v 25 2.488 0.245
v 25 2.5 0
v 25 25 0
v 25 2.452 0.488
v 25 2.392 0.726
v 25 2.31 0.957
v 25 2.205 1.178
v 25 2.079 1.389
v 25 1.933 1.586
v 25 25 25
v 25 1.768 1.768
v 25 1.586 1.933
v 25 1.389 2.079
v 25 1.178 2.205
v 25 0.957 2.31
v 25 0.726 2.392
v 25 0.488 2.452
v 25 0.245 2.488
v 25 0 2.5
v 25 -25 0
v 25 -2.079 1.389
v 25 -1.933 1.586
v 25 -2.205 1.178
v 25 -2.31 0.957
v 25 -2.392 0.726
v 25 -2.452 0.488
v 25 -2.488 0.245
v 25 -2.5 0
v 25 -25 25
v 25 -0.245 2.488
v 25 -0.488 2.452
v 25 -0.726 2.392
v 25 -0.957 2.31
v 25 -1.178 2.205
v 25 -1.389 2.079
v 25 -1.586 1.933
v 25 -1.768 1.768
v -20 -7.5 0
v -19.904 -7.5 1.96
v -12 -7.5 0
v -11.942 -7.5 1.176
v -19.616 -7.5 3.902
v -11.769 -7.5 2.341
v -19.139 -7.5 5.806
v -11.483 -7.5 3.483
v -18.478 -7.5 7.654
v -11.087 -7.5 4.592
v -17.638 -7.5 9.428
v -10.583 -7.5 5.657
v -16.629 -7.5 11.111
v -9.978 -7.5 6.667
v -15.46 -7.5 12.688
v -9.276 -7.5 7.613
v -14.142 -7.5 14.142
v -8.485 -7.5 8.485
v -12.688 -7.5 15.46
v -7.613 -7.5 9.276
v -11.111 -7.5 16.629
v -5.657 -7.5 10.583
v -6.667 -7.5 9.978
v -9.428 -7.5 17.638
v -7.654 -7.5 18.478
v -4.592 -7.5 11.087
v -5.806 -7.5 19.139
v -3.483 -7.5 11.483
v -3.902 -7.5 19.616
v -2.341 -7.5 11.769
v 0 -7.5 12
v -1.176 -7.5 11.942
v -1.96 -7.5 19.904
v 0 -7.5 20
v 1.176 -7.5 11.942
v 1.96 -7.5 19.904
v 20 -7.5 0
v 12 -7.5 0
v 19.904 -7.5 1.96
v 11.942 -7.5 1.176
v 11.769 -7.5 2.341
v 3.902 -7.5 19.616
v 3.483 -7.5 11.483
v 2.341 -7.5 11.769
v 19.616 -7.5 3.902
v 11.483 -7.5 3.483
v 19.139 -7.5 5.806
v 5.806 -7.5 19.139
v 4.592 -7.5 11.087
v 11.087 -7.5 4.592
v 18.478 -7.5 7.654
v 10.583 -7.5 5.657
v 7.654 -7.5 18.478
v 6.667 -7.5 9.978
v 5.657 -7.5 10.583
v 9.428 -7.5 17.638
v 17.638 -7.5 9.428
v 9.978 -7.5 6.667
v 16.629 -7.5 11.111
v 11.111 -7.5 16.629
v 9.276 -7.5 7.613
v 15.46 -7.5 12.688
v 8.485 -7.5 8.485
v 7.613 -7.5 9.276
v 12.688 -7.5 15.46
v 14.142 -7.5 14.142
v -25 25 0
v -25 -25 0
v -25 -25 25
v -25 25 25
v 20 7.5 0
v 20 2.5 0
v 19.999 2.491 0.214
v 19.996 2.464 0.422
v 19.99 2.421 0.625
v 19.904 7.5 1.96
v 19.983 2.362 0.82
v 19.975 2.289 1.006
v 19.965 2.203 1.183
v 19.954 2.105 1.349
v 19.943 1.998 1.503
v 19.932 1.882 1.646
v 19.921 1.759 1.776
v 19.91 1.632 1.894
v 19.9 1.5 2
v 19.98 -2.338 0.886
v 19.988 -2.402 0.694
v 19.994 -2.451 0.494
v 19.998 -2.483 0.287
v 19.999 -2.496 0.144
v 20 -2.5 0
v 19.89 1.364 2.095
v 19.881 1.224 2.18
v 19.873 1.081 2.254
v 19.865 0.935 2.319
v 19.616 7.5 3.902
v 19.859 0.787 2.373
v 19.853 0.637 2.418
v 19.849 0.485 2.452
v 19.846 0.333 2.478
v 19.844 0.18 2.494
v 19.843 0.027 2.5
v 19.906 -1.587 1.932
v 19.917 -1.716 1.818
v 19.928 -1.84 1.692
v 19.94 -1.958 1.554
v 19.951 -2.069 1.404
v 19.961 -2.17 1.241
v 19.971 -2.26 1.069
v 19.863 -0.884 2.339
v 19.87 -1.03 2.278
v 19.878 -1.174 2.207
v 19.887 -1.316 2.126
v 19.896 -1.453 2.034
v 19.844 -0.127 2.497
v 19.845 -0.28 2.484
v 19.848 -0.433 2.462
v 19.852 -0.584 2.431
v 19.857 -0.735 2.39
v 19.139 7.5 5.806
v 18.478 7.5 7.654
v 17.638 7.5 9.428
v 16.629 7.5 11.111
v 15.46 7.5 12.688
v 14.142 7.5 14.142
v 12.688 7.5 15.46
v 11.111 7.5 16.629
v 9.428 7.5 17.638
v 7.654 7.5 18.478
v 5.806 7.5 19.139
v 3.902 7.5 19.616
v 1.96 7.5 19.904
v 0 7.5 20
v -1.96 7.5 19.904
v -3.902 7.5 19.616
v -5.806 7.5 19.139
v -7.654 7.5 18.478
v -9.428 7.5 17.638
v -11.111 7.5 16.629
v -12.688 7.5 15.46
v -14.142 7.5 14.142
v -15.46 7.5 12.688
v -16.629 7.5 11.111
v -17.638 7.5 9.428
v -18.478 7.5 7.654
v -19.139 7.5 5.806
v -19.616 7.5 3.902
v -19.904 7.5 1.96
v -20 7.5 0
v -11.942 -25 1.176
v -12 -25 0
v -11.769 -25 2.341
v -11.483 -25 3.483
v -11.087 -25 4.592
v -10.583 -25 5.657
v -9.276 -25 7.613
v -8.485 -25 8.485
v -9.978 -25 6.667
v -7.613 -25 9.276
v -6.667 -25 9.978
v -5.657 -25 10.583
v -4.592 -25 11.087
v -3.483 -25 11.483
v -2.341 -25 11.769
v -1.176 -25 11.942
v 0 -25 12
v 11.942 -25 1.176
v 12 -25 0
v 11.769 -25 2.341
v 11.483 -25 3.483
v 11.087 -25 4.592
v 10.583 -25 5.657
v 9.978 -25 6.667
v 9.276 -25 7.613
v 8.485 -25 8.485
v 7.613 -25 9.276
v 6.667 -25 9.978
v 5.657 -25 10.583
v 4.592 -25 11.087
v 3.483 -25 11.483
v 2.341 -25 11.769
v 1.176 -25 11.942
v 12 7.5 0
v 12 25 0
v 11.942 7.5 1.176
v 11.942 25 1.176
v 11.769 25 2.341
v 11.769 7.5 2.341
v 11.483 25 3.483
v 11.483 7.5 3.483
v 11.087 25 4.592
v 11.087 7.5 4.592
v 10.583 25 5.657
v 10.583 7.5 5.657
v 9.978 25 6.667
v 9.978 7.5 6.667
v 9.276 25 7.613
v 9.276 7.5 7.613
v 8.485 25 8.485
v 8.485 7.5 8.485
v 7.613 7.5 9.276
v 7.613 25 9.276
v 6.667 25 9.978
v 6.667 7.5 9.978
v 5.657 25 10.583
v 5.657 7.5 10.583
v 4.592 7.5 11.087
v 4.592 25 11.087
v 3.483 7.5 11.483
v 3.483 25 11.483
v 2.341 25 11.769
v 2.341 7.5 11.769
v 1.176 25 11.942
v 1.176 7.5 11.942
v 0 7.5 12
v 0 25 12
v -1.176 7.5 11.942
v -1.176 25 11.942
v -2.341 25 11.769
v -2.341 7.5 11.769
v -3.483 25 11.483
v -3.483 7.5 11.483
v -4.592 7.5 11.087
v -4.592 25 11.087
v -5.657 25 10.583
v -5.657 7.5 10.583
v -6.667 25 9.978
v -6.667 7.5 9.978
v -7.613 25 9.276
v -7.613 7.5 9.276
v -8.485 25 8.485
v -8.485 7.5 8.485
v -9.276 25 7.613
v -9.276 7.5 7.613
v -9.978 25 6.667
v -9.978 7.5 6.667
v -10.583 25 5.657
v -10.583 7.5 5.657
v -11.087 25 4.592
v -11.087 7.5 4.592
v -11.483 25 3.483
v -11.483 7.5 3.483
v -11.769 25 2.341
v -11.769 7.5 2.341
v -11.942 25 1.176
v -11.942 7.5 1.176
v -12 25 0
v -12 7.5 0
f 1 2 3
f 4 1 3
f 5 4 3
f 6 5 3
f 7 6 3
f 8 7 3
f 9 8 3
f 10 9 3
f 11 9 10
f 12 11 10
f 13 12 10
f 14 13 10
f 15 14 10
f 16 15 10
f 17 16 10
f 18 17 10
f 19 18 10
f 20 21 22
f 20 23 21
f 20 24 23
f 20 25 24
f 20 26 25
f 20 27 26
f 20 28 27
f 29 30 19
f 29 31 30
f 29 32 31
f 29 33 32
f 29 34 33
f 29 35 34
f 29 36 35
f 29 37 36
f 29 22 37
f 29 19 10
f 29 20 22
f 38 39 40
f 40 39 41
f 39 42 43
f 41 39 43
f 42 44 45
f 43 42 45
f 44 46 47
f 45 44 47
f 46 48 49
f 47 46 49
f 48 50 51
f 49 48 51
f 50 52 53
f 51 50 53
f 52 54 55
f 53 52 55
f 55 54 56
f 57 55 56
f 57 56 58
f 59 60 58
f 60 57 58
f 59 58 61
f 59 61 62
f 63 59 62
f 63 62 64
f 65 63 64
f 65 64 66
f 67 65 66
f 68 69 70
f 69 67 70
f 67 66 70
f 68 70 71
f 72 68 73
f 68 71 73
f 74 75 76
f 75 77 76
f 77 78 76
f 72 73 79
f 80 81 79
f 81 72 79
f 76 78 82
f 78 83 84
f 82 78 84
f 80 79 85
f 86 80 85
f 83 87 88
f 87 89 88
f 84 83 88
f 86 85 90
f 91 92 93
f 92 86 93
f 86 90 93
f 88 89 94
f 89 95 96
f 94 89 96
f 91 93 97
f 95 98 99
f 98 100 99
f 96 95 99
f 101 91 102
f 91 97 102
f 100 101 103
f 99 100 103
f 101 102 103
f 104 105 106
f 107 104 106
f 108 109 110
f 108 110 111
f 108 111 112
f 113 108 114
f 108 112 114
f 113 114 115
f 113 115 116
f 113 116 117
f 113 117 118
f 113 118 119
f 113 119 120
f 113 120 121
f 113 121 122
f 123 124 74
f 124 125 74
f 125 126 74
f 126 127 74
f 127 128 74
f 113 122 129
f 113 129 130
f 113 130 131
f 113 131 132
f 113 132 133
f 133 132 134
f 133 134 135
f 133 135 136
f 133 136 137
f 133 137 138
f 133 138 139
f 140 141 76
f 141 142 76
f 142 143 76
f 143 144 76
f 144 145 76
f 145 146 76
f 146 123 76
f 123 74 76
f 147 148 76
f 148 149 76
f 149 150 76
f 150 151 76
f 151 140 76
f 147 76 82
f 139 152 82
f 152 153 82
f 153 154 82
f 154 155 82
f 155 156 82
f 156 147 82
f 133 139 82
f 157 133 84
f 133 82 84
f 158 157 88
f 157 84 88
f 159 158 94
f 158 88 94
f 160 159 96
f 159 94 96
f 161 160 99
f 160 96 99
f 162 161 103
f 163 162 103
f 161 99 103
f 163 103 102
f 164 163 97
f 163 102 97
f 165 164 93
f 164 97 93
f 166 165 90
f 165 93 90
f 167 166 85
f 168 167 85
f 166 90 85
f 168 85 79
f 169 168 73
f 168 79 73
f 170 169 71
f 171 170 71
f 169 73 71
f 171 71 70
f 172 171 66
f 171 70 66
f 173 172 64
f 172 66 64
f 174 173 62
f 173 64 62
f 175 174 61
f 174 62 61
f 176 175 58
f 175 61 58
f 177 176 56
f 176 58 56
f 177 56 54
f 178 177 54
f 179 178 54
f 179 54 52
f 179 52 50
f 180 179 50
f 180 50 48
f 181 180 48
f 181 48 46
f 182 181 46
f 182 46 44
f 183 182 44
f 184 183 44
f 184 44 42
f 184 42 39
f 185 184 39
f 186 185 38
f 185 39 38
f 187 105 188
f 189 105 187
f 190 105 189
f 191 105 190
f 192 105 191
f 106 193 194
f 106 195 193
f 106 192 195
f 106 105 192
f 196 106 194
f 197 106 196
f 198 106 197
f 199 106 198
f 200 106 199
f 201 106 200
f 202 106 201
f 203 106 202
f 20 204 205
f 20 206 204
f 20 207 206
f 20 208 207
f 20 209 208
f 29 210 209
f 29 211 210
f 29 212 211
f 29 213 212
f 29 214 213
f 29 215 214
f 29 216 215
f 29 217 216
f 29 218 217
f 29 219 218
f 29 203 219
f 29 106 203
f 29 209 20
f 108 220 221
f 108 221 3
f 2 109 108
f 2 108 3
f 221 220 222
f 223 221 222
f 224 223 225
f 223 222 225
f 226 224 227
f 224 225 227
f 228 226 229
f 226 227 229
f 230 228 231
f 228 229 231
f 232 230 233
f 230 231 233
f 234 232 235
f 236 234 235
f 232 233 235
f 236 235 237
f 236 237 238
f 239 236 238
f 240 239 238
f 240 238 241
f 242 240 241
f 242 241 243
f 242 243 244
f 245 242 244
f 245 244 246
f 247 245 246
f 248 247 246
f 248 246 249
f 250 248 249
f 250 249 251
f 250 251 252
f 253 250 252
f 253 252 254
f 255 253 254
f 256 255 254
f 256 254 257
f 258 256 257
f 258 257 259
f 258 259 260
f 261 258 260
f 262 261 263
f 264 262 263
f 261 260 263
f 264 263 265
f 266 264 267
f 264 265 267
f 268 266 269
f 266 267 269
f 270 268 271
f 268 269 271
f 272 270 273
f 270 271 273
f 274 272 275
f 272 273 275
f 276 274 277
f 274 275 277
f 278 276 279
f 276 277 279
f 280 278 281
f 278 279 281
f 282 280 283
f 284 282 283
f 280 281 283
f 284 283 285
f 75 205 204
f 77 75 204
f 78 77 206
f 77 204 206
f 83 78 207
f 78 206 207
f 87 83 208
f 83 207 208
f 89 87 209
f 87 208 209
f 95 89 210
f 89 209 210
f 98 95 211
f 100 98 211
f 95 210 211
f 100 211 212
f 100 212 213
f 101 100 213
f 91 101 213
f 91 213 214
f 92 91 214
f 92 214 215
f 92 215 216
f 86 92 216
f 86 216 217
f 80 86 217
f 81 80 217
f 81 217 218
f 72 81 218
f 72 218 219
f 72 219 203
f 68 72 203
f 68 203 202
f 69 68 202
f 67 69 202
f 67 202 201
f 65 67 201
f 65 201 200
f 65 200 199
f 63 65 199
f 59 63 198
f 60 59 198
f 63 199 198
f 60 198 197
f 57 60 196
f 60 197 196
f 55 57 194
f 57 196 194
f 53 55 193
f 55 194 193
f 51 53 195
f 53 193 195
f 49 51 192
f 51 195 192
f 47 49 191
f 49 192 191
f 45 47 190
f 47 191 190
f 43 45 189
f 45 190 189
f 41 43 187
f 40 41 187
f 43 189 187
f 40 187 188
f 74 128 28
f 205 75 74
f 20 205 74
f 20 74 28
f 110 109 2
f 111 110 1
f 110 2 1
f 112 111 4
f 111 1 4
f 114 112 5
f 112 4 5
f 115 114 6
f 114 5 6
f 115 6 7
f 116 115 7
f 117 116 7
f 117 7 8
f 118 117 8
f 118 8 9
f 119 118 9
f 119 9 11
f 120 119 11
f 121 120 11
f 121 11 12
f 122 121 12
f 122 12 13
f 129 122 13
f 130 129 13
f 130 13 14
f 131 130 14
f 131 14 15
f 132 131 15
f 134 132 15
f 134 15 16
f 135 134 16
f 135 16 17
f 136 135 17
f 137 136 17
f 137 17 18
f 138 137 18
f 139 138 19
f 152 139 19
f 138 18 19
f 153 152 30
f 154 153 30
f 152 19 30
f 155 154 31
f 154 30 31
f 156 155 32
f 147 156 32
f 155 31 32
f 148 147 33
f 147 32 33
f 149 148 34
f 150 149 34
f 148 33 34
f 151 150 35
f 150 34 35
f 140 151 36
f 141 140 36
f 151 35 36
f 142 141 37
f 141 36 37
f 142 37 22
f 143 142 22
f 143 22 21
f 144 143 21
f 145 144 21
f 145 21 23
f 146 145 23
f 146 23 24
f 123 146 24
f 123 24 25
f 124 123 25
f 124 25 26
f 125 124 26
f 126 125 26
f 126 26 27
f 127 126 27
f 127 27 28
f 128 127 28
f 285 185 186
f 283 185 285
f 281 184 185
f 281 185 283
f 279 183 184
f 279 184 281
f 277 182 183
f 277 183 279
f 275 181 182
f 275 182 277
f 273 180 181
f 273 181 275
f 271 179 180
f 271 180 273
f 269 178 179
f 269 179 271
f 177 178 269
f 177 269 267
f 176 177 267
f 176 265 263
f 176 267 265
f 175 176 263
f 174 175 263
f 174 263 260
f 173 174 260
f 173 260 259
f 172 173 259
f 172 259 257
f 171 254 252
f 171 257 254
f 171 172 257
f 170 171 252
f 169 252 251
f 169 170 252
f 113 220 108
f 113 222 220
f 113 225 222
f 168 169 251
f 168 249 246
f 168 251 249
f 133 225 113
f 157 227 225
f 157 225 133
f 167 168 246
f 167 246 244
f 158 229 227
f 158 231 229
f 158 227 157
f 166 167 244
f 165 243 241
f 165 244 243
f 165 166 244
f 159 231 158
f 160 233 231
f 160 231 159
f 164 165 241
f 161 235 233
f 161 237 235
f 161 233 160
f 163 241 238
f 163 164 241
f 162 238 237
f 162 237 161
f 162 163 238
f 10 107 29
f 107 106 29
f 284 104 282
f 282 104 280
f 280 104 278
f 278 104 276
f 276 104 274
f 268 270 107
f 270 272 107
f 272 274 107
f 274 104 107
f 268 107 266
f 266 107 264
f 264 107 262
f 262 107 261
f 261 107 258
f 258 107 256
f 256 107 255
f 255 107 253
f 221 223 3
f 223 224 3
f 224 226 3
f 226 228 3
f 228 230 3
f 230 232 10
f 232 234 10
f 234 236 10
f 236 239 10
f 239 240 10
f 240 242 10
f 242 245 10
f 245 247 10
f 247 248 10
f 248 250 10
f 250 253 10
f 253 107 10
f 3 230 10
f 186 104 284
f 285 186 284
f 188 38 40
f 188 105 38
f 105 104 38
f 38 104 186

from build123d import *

# Parameters (mm, degrees)
F0_W     = 50
F0_H     = 25
F1_DEPTH = 25
F3_DEPTH = 25
F4_R     = 20
F5_DEPTH = 7.5
F7_DEPTH = 50.001


with BuildPart() as f1:
    # F0 (on Front) → F1 (new body, symmetric)
    with BuildSketch(Plane.XZ):
        with Locations((0, 12.5)):
            Rectangle(F0_W, F0_H)
    extrude(amount=F1_DEPTH, both=True)

    # F2 (on face) → F3 (cut)
    with BuildSketch(Plane.YZ.offset(25)):
        with BuildLine():
            Line((-2.5, 0), (2.5, 0))
            ThreePointArc((2.5, 0), (0, 2.5), (-2.5, 0))
        make_face()
    extrude(amount=-F3_DEPTH, mode=Mode.SUBTRACT)

    # F4 (on Front) → F5 (cut, symmetric)
    with BuildSketch(Plane.XZ):
        Circle(F4_R)
    extrude(amount=F5_DEPTH, both=True, mode=Mode.SUBTRACT)

    # F6 (on face) → F7 (cut, through all)
    with BuildSketch(Plane.XZ.offset(25)):
        with BuildLine():
            Line((-12, 0), (12, 0))
            ThreePointArc((12, 0), (0, 12), (-12, 0))
        make_face()
    extrude(amount=-F7_DEPTH, mode=Mode.SUBTRACT)


solid = f1.part
